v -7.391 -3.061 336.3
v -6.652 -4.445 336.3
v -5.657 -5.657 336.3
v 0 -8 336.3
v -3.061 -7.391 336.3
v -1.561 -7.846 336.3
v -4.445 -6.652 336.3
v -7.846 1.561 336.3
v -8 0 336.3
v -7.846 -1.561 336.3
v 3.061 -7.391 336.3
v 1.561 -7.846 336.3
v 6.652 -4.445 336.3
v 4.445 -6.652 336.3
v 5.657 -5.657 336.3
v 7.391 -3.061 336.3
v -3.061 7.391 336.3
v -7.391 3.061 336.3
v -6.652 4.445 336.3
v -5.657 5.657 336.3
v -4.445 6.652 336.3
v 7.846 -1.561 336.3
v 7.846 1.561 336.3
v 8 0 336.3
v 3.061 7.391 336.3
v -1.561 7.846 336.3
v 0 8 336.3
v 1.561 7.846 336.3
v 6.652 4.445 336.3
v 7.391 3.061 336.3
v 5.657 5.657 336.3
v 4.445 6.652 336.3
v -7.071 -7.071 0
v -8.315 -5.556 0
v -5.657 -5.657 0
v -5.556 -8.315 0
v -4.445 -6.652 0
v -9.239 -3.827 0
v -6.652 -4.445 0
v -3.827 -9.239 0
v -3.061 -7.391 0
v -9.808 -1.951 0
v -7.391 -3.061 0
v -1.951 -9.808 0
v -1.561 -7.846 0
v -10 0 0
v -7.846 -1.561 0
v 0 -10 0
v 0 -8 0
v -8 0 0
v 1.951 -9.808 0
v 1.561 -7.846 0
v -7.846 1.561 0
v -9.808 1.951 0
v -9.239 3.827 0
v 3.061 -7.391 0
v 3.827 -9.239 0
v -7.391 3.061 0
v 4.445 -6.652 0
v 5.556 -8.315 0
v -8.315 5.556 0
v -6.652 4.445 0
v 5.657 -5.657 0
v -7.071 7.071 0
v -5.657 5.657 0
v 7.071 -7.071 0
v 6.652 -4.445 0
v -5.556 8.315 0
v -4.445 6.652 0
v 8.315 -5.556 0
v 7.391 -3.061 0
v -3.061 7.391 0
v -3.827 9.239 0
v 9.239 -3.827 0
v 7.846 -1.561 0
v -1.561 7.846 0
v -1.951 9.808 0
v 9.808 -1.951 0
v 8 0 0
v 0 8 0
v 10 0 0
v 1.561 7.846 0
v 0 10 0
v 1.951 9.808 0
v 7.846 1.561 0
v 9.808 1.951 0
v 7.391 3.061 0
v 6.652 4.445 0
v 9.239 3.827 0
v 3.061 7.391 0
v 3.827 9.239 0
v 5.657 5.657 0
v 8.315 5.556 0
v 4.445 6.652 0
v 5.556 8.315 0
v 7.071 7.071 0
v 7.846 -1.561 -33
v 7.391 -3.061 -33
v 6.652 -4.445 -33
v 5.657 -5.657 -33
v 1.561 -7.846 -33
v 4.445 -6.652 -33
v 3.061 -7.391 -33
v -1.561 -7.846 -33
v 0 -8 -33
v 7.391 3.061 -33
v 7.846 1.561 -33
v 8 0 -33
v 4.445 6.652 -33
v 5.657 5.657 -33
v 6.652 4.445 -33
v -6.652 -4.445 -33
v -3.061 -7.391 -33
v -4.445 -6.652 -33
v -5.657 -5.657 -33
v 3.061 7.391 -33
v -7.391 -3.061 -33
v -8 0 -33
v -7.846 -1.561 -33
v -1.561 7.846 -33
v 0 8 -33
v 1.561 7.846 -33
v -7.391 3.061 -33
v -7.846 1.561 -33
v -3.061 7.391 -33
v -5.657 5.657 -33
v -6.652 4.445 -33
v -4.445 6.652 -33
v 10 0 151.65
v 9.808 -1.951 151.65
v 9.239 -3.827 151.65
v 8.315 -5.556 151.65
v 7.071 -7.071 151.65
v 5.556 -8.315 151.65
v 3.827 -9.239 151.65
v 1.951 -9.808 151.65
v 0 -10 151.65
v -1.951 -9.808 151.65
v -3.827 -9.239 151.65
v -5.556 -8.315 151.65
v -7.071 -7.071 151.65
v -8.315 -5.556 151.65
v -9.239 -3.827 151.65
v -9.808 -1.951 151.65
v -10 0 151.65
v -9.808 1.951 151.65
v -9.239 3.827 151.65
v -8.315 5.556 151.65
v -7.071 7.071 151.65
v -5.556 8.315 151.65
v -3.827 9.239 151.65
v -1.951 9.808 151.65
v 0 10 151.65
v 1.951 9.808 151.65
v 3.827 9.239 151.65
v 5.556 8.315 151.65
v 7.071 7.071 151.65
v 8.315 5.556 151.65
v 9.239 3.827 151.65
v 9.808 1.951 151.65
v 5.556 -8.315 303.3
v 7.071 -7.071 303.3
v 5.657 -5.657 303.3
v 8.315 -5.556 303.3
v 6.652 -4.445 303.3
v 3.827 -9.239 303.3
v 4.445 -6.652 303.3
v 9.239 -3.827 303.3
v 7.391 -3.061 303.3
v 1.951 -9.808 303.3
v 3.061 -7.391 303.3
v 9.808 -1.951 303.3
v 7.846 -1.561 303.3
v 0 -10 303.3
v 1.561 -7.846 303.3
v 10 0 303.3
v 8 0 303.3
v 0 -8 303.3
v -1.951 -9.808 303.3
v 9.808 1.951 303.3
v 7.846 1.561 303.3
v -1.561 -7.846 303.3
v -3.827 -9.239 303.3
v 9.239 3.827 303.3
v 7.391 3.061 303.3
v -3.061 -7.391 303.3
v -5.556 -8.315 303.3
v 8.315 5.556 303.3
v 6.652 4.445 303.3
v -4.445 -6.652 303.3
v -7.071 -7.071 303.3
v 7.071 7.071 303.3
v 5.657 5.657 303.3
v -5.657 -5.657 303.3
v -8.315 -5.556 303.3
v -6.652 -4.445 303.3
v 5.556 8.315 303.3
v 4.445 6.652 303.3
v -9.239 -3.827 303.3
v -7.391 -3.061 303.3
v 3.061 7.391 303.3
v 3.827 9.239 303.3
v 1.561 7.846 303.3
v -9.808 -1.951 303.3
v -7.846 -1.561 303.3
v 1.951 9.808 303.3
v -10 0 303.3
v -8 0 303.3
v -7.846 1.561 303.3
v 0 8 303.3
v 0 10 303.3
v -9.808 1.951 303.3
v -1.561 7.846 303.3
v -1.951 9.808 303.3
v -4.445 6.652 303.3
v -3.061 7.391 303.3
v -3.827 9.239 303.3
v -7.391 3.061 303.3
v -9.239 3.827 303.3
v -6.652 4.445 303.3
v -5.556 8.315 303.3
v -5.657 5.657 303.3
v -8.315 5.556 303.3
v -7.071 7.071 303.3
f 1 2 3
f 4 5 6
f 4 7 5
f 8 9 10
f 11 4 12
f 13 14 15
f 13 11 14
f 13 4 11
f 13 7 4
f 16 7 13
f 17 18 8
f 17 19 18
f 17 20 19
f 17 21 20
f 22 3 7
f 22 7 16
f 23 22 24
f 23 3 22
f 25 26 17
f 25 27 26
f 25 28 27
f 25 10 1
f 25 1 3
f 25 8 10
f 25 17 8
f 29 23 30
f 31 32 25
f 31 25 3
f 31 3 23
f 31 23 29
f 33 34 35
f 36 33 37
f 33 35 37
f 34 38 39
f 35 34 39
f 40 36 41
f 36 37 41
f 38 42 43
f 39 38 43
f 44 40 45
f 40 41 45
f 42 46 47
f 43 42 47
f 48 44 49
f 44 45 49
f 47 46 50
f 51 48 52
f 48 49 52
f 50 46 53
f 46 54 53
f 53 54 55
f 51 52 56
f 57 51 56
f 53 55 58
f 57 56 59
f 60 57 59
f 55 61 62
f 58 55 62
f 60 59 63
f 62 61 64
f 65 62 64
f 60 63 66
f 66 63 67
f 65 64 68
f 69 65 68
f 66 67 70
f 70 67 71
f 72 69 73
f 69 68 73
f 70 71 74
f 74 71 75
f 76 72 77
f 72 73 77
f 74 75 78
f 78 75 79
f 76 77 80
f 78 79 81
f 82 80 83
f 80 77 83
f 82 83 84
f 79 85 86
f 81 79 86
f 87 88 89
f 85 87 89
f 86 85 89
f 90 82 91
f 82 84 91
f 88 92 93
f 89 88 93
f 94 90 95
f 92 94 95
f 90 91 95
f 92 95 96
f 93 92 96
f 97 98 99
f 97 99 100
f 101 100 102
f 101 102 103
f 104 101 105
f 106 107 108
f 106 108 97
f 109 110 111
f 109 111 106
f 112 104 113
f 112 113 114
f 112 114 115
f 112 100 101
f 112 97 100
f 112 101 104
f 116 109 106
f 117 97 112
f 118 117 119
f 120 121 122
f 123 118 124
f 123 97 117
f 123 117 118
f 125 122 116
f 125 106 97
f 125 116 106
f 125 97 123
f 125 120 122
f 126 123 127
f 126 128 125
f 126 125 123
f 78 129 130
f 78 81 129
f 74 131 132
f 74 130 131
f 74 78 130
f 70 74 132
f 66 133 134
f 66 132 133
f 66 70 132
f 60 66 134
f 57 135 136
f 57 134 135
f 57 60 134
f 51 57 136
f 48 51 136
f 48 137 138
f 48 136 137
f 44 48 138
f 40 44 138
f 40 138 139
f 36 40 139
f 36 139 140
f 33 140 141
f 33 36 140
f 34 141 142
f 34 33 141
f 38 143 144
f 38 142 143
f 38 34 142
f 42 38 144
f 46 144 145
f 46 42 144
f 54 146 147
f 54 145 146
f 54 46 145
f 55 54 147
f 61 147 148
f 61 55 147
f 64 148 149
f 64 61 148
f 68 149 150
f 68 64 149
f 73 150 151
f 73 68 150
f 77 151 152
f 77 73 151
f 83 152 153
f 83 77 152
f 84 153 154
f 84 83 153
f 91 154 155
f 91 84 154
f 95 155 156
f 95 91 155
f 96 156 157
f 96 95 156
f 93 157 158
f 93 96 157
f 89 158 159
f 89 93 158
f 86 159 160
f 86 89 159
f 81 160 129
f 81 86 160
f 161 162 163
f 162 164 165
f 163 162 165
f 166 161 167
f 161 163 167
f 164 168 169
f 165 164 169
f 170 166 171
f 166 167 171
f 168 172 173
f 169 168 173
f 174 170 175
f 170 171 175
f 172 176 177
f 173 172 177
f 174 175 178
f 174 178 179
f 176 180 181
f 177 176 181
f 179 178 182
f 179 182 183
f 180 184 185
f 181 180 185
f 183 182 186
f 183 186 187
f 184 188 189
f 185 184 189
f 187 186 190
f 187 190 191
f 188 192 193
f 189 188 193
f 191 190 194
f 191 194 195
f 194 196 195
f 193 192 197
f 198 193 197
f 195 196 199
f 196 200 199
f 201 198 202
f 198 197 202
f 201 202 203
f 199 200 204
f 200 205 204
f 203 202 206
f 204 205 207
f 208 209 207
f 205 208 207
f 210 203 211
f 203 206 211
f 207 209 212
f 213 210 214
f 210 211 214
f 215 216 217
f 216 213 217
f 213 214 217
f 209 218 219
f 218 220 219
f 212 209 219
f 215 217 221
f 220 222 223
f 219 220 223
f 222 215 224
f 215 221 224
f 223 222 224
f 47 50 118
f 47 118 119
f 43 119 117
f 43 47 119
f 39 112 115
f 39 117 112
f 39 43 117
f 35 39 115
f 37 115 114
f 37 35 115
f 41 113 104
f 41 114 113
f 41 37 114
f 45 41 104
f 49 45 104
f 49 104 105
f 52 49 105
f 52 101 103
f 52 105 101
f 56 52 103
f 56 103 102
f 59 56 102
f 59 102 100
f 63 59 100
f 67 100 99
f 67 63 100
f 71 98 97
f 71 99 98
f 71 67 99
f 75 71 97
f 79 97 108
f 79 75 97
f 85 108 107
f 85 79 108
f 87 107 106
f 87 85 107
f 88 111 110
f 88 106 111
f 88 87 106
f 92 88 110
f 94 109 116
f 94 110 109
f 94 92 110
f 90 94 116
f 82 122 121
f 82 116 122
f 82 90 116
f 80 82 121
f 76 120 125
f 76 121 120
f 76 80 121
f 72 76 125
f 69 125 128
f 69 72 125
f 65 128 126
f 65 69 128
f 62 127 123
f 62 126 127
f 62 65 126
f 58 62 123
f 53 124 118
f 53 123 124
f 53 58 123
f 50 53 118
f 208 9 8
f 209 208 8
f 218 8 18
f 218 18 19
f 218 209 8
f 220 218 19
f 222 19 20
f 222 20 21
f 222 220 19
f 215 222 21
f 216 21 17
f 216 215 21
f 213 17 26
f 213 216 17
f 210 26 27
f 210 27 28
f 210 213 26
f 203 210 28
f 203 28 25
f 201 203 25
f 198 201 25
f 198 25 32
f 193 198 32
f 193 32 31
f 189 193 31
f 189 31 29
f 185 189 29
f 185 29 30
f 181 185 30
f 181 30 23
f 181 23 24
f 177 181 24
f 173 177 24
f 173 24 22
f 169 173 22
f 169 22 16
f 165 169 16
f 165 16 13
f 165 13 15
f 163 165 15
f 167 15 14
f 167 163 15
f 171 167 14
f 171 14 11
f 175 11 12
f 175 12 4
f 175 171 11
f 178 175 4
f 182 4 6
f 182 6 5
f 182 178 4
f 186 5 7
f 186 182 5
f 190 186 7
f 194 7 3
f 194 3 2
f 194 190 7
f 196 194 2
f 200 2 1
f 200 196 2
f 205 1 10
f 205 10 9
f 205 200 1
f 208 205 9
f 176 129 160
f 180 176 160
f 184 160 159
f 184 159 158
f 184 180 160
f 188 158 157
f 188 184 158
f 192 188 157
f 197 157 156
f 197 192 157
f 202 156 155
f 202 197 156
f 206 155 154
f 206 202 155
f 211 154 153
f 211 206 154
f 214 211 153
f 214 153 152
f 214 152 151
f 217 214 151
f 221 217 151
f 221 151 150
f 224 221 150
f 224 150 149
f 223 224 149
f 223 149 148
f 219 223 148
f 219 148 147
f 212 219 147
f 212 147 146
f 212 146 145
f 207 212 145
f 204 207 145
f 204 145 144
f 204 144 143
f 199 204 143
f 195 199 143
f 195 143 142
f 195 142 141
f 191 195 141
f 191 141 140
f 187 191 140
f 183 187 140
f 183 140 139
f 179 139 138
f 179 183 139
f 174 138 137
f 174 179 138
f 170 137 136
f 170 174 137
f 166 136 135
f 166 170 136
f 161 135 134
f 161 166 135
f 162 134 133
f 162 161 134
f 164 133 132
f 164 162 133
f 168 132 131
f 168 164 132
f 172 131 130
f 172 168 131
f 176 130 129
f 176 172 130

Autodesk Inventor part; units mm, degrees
ref_plane "YZ Plane" through (0, 0, 0) normal (1, 0, 0) x (0, 1, 0)
ref_plane "XZ Plane" through (0, 0, 0) normal (0, 1, 0) x (-1, 0, 0)
ref_plane "XY Plane" through (0, 0, 0) normal (0, 0, 1) x (1, 0, 0)
sketch "Sketch1" plane through (0, 0, 0) normal (0, 0, 1) x (1, 0, 0)
  circle A0 centre (0, 0) radius 10
  dimension "d0" = 20
extrude "Extrusion1" add sketch "Sketch1" along normal blind 151.65
sketch "Sketch2" plane through (0, 0, 0) normal (0, 0, -1) x (-1, 0, 0)
  circle A0 centre (0, 0) radius 8
  dimension "d3" = 16
extrude "Extrusion2" add sketch "Sketch2" along normal blind 33
mirror "Mirror1" about plane through (0, 0, 151.65) normal (0, 0, 1) of "Extrusion1", "Extrusion2"
properties part number "BielaConexion"
